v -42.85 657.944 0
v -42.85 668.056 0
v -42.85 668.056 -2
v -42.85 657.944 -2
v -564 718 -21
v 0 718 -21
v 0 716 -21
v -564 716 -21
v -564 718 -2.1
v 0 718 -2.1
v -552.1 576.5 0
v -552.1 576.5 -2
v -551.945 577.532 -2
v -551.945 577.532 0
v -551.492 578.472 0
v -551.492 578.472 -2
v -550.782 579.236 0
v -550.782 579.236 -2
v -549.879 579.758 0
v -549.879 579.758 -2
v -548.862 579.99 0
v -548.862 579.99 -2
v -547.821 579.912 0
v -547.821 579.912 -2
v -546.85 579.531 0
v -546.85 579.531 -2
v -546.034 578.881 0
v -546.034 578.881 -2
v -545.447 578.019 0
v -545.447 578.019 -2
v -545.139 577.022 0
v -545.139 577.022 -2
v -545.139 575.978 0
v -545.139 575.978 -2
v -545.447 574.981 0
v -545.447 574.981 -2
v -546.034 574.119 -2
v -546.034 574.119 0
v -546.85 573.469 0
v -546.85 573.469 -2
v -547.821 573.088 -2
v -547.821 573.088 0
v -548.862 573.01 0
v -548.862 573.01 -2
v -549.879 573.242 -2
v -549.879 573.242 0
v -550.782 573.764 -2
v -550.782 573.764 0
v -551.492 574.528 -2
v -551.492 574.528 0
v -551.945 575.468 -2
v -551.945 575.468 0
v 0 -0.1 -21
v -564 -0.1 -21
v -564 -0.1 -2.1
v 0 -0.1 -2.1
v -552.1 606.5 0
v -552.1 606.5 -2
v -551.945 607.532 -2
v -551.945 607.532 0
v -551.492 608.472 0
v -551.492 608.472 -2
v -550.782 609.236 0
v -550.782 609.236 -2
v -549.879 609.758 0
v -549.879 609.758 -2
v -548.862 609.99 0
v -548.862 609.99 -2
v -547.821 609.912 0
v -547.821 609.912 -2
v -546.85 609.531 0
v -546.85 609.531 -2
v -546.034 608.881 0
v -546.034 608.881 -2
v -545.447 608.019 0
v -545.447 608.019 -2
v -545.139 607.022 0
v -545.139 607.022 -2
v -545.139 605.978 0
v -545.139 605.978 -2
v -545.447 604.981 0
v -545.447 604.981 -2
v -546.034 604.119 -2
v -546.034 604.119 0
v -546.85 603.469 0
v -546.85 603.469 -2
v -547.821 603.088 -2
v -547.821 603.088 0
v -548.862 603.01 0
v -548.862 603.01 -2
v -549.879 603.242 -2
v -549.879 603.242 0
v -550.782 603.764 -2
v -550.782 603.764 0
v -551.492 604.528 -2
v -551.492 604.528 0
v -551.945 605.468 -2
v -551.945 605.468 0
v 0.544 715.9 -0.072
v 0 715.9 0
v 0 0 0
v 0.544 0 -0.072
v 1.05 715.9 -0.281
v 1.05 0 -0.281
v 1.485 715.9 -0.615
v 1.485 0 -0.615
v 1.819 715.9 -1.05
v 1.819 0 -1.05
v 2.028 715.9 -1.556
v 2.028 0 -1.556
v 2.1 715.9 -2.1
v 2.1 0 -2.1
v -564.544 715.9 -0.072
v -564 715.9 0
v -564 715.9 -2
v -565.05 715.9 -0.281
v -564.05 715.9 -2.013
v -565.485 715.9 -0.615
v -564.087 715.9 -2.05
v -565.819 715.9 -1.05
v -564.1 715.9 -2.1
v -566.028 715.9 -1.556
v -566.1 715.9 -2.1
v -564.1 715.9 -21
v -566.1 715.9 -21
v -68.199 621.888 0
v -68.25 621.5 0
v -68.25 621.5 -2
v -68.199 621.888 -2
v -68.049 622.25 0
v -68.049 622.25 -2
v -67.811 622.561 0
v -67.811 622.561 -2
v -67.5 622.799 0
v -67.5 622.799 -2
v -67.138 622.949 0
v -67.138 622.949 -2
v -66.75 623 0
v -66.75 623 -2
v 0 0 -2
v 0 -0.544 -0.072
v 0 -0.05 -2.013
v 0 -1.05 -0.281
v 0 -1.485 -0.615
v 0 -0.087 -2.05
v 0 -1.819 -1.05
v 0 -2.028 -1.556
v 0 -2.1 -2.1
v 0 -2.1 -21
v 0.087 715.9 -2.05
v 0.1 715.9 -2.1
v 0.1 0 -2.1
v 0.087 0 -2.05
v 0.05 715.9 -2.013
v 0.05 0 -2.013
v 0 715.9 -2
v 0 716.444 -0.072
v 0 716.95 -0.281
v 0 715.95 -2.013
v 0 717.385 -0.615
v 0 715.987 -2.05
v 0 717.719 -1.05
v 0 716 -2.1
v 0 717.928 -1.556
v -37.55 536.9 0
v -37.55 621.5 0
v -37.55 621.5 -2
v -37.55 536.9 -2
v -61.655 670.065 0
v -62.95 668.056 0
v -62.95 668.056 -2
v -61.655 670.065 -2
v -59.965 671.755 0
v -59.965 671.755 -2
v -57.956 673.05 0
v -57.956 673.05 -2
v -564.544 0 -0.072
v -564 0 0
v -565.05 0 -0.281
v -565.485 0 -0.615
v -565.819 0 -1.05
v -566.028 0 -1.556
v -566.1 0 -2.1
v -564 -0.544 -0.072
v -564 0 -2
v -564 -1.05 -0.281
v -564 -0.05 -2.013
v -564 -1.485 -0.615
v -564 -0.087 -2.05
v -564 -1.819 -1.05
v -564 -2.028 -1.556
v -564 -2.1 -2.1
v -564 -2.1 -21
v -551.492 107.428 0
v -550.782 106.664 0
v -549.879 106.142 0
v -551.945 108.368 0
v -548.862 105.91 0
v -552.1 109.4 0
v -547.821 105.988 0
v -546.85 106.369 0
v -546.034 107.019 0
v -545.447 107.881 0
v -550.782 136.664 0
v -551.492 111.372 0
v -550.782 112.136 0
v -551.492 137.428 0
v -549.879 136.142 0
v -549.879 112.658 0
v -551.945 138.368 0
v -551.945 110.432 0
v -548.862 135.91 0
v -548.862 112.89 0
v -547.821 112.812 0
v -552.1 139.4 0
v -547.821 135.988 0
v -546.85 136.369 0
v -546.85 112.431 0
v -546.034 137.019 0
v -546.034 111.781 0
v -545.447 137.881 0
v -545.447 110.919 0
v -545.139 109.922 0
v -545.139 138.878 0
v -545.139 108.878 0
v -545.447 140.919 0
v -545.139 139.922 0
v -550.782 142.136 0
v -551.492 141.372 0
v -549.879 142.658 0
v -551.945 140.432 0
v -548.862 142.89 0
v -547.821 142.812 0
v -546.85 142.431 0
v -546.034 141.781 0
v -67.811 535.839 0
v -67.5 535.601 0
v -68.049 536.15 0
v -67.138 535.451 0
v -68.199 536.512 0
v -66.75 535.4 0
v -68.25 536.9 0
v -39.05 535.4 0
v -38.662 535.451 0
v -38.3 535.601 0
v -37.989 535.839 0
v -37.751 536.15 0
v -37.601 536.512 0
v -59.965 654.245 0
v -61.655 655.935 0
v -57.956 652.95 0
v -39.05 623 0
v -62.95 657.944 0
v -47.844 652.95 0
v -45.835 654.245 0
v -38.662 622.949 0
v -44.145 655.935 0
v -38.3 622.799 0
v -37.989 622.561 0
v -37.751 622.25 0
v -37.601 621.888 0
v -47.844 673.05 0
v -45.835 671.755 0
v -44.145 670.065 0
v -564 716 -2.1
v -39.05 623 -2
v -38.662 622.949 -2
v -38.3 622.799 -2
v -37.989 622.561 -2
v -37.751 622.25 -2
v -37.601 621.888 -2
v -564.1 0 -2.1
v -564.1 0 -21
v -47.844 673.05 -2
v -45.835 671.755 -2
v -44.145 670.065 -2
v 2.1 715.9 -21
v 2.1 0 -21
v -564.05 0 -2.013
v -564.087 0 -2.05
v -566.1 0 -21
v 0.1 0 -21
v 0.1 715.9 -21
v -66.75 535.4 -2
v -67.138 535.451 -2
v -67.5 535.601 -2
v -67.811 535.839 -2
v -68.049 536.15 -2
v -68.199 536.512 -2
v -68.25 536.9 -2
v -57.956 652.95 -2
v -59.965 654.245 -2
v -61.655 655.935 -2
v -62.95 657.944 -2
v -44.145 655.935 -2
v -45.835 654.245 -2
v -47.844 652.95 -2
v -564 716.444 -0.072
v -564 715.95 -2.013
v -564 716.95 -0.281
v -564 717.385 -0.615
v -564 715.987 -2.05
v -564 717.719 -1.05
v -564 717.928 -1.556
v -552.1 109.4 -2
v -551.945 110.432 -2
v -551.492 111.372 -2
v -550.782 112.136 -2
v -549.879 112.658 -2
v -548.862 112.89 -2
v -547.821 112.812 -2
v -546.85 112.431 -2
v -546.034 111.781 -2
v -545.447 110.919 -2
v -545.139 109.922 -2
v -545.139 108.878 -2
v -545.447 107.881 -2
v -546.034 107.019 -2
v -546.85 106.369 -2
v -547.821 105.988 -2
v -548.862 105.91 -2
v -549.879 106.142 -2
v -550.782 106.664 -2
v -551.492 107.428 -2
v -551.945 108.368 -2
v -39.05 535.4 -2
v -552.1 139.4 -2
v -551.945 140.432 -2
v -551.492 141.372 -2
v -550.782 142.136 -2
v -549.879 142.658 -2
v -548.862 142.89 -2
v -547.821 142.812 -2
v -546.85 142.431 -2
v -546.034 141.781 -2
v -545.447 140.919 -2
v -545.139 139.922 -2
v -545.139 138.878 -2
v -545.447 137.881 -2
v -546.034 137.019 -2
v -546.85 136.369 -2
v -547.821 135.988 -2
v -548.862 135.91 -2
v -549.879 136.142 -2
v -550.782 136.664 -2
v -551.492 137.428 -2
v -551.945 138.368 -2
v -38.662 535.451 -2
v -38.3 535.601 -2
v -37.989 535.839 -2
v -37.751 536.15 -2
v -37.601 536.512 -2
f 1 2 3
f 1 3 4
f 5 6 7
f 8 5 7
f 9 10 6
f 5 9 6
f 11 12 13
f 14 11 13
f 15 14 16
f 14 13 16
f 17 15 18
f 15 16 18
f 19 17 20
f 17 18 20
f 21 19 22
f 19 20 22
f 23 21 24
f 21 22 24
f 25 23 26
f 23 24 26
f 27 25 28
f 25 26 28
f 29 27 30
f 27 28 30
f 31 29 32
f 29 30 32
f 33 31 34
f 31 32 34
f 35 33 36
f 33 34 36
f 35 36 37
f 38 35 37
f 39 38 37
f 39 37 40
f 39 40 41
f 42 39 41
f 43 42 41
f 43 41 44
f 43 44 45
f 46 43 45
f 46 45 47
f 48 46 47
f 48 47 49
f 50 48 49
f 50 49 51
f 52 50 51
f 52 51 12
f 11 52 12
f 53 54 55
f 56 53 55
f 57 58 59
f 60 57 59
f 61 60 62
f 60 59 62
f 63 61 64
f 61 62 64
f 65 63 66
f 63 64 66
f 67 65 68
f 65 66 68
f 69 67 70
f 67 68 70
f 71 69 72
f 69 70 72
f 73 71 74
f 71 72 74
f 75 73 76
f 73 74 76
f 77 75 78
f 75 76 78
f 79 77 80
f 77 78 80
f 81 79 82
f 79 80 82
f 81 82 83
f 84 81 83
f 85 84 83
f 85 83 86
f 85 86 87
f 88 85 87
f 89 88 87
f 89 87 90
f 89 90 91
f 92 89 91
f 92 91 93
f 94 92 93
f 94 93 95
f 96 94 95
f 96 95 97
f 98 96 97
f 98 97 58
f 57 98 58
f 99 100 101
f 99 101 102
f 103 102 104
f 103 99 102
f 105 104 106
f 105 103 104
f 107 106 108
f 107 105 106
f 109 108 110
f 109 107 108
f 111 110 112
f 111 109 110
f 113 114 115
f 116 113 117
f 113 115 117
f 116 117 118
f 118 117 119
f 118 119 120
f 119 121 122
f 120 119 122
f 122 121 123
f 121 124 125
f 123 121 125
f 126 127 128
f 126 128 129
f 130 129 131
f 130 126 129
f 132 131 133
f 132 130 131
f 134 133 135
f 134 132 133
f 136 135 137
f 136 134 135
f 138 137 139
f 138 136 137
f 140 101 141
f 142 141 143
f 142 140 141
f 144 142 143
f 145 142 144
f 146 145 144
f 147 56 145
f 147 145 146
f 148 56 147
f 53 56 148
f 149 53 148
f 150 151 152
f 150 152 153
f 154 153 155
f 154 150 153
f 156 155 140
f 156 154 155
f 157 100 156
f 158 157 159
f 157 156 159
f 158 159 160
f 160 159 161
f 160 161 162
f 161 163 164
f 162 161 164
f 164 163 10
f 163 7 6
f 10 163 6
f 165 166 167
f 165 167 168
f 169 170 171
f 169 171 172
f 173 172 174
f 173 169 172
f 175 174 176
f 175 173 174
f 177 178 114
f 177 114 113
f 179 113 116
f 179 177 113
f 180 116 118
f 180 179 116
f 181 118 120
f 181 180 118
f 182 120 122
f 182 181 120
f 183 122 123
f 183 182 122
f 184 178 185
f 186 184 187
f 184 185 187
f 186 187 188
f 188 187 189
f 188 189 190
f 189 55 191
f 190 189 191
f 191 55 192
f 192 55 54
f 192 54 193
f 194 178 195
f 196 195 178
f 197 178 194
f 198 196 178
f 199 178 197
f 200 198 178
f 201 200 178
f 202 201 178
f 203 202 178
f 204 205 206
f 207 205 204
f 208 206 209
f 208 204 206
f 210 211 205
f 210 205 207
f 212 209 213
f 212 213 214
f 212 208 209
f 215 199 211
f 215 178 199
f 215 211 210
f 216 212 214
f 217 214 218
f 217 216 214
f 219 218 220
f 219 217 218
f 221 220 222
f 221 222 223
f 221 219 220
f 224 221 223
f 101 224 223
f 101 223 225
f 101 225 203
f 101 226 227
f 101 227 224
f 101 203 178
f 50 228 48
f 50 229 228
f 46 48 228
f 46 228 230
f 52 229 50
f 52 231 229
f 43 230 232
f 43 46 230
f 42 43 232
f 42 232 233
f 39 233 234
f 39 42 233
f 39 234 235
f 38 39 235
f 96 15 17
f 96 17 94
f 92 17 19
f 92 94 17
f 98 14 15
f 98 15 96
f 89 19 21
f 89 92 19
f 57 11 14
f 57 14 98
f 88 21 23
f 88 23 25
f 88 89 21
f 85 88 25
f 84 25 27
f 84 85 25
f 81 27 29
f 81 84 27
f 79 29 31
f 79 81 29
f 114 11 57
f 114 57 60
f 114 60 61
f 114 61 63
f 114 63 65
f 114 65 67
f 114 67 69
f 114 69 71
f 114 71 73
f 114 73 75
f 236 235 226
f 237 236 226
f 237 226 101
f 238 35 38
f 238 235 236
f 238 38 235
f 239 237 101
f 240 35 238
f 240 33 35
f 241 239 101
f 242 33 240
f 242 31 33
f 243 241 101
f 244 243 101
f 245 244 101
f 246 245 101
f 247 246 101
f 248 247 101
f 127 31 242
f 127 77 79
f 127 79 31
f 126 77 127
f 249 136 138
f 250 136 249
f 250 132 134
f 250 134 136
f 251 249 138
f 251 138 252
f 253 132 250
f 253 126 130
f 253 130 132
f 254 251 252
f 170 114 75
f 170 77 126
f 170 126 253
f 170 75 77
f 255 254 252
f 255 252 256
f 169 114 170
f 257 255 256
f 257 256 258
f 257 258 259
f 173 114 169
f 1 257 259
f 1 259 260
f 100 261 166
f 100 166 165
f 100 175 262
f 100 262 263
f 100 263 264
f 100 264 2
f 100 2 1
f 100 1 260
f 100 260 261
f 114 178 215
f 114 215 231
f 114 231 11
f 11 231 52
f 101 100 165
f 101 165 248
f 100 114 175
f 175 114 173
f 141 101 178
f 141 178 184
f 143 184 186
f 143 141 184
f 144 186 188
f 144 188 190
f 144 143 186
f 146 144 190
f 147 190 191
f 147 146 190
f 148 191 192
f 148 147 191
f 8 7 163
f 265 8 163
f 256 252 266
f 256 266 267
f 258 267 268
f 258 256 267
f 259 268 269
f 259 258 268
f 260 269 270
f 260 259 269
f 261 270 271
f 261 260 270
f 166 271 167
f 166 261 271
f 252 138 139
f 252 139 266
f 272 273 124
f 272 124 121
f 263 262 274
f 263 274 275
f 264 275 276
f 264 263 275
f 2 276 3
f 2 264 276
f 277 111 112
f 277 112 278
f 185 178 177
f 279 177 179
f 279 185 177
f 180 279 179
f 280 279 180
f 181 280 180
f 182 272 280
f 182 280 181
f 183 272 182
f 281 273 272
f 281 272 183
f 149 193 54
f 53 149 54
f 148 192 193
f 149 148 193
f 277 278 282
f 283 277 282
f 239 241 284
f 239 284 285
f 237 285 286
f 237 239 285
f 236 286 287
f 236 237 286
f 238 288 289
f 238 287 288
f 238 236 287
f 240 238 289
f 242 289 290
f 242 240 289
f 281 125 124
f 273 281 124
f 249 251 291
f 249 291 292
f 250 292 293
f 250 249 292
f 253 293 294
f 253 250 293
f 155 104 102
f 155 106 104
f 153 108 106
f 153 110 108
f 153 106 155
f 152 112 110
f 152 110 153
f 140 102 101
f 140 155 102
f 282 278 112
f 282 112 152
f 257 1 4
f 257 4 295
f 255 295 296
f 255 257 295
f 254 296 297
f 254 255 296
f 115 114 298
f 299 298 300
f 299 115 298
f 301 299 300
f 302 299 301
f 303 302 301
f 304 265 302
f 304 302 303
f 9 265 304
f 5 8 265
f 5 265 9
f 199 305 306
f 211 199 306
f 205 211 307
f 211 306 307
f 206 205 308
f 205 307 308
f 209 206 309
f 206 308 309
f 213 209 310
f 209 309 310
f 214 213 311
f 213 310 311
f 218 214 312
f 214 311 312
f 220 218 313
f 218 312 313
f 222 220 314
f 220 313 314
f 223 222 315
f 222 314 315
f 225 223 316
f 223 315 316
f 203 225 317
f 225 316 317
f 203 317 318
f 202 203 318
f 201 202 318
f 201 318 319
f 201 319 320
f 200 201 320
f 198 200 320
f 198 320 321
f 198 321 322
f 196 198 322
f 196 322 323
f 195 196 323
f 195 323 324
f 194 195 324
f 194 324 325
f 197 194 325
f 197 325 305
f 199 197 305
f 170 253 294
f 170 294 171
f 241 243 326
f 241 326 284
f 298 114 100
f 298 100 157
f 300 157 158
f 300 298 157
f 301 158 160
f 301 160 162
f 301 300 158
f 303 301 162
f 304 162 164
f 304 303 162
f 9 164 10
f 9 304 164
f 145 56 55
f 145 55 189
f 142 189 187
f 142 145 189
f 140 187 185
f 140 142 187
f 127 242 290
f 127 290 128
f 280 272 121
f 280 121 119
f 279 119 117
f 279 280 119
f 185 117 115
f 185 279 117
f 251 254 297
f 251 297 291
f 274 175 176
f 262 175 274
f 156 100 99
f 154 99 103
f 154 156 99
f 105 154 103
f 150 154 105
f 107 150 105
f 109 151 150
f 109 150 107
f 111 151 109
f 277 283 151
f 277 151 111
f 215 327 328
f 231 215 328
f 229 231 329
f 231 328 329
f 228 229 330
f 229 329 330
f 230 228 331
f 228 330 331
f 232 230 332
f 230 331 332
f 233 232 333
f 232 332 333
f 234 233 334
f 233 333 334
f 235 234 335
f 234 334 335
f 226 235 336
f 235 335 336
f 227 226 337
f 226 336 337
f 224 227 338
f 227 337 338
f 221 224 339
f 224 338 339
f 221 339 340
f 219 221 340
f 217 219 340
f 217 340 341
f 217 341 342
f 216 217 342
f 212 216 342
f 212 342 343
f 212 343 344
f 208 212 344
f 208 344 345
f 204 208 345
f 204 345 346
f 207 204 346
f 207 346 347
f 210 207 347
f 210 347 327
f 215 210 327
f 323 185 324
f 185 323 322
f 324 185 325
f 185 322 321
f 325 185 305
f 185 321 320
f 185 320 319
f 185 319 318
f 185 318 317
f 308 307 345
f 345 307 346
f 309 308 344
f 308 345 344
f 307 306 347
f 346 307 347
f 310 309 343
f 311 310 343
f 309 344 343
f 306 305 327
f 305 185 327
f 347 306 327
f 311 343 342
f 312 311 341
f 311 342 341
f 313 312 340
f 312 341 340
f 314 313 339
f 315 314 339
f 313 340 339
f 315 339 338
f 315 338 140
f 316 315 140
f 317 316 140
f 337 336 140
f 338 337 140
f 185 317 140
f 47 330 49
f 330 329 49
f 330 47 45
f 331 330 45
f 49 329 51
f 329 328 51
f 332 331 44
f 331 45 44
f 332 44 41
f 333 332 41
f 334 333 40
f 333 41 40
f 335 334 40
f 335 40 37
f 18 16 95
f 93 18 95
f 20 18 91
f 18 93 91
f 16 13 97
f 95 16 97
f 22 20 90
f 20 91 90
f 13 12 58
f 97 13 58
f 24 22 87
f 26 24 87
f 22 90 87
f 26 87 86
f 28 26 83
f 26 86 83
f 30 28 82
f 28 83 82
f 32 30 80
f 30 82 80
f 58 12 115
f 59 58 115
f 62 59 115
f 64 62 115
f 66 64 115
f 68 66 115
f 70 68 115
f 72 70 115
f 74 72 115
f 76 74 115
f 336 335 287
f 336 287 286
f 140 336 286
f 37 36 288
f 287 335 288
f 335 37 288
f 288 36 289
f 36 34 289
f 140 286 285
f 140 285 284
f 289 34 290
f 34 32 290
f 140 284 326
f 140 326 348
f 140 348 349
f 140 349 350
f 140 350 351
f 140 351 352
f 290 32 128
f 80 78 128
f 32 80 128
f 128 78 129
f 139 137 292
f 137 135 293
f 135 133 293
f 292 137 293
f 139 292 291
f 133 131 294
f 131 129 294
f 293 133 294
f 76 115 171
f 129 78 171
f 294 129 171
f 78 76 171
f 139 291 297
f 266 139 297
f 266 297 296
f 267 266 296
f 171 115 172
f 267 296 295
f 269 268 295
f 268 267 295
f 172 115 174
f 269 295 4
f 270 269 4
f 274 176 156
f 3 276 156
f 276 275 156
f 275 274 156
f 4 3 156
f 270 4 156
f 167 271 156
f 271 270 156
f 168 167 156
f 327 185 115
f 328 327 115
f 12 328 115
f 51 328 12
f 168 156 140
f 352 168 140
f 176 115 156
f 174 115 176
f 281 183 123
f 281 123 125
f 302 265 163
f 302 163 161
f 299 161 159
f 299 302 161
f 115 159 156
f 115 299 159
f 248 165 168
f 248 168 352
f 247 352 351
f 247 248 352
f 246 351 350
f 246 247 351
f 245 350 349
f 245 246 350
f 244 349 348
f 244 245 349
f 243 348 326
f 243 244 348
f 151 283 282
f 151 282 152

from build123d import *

# Parameters (mm, degrees)
SKIZZE1_W                          = 564
SKIZZE1_H                          = 715.9
BASIS_BLECH_DEPTH                  = 2
KANTE_LASCHE1_DEPTH                = 715.9
KANTE_LASCHE2_DEPTH                = 564
KANTE_LASCHE3_DEPTH                = 715.9
KANTE_LASCHE4_DEPTH                = 564
SCHNITT_LINEAR_AUSTRAGEN1_REACH    = 916.568
F_7_0_7_DURCHMESSER_BOHRUNG1_D     = 7
F_7_0_7_DURCHMESSER_BOHRUNG1_DEPTH = 20
F_7_0_7_DURCHMESSER_BOHRUNG1_TIP   = 2.103012167


# Sheet-metal steps are written as plain solids
with BuildPart() as part:
    # Skizze1 → Basis-Blech (new body)
    with BuildSketch(Plane.XY):
        with Locations((-282, 357.95)):
            Rectangle(SKIZZE1_W, SKIZZE1_H)
    extrude(amount=-BASIS_BLECH_DEPTH)

    # Kante-Lasche1 section (across the edge) → Kante-Lasche1 (add)
    with BuildSketch(Plane(origin=(0.1, 715.9, -2), x_dir=(-1, 0, 0), z_dir=(0, -1, 0))):
        with BuildLine():
            Line((-2, 0.1), (-2, 19))
            Line((-2, 19), (0, 19))
            Line((0, 19), (0, 0.1))
            ThreePointArc((0, 0.1), (0.029289322, 0.029289322), (0.1, 0))
            Line((0.1, 0), (0.1, -2))
            ThreePointArc((0.1, -2), (-1.38492424, -1.38492424), (-2, 0.1))
        make_face()
    extrude(amount=KANTE_LASCHE1_DEPTH)

    # Kante-Lasche2 section (across the edge) → Kante-Lasche2 (add)
    with BuildSketch(Plane(origin=(-564, 716, -2), x_dir=(0, -1, 0), z_dir=(1, 0, 0))):
        with BuildLine():
            Line((-2, 0.1), (-2, 19))
            Line((-2, 19), (0, 19))
            Line((0, 19), (0, 0.1))
            ThreePointArc((0, 0.1), (0.029289322, 0.029289322), (0.1, 0))
            Line((0.1, 0), (0.1, -2))
            ThreePointArc((0.1, -2), (-1.38492424, -1.38492424), (-2, 0.1))
        make_face()
    extrude(amount=KANTE_LASCHE2_DEPTH)

    # Kante-Lasche3 section (across the edge) → Kante-Lasche3 (add)
    with BuildSketch(Plane(origin=(-564.1, 0, -2), x_dir=(1, 0, 0), z_dir=(0, 1, 0))):
        with BuildLine():
            Line((-2, 0.1), (-2, 19))
            Line((-2, 19), (0, 19))
            Line((0, 19), (0, 0.1))
            ThreePointArc((0, 0.1), (0.029289322, 0.029289322), (0.1, 0))
            Line((0.1, 0), (0.1, -2))
            ThreePointArc((0.1, -2), (-1.38492424, -1.38492424), (-2, 0.1))
        make_face()
    extrude(amount=KANTE_LASCHE3_DEPTH)

    # Kante-Lasche4 section (across the edge) → Kante-Lasche4 (add)
    with BuildSketch(Plane(origin=(0, -0.1, -2), x_dir=(0, 1, 0), z_dir=(-1, 0, 0))):
        with BuildLine():
            Line((-2, 0.1), (-2, 19))
            Line((-2, 19), (0, 19))
            Line((0, 19), (0, 0.1))
            ThreePointArc((0, 0.1), (0.029289322, 0.029289322), (0.1, 0))
            Line((0.1, 0), (0.1, -2))
            ThreePointArc((0.1, -2), (-1.38492424, -1.38492424), (-2, 0.1))
        make_face()
    extrude(amount=KANTE_LASCHE4_DEPTH)

    # Skizze17 → Schnitt-Linear austragen1 (cut, up to next)
    with BuildSketch(Plane.XY, mode=Mode.PRIVATE) as schnitt_linear_austragen1_sk1:
        with BuildLine():
            Line((-62.95, 657.944310136), (-62.95, 668.055689864))
            ThreePointArc((-62.95, 668.055689864), (-60.854951288, 670.954951288), (-57.955689864, 673.05))
            Line((-57.955689864, 673.05), (-47.844310136, 673.05))
            ThreePointArc((-47.844310136, 673.05), (-44.945048712, 670.954951288), (-42.85, 668.055689864))
            Line((-42.85, 668.055689864), (-42.85, 657.944310136))
            ThreePointArc((-42.85, 657.944310136), (-44.945048712, 655.045048712), (-47.844310136, 652.95))
            Line((-47.844310136, 652.95), (-57.955689864, 652.95))
            ThreePointArc((-57.955689864, 652.95), (-60.854951288, 655.045048712), (-62.95, 657.944310136))
        make_face()
    schnitt_linear_austragen1_tool1 = extrude(schnitt_linear_austragen1_sk1.sketch, amount=-SCHNITT_LINEAR_AUSTRAGEN1_REACH, mode=Mode.PRIVATE) & part.part
    # Skizze17 → Schnitt-Linear austragen1 (cut, up to next)
    with BuildSketch(Plane.XY, mode=Mode.PRIVATE) as schnitt_linear_austragen1_sk2:
        with BuildLine():
            Line((-66.75, 623), (-39.05, 623))
            ThreePointArc((-39.05, 623), (-37.989339828, 622.560660172), (-37.55, 621.5))
            Line((-37.55, 621.5), (-37.55, 536.9))
            ThreePointArc((-37.55, 536.9), (-37.989339828, 535.839339828), (-39.05, 535.4))
            Line((-39.05, 535.4), (-66.75, 535.4))
            ThreePointArc((-66.75, 535.4), (-67.810660172, 535.839339828), (-68.25, 536.9))
            Line((-68.25, 536.9), (-68.25, 621.5))
            ThreePointArc((-68.25, 621.5), (-67.810660172, 622.560660172), (-66.75, 623))
        make_face()
    schnitt_linear_austragen1_tool2 = extrude(schnitt_linear_austragen1_sk2.sketch, amount=-SCHNITT_LINEAR_AUSTRAGEN1_REACH, mode=Mode.PRIVATE) & part.part
    add(schnitt_linear_austragen1_tool1.solids().sort_by_distance((-52.9, 663, 0))[0], mode=Mode.SUBTRACT)
    add(schnitt_linear_austragen1_tool2.solids().sort_by_distance((-52.9, 579.2, 0))[0], mode=Mode.SUBTRACT)

    # Ø7.0 (7) Durchmesser Bohrung1
    with Locations(Plane.XY):
        with Locations((-548.6, 109.4), (-548.6, 139.4), (-548.6, 576.5), (-548.6, 606.5)):
            Hole(F_7_0_7_DURCHMESSER_BOHRUNG1_D / 2, depth=F_7_0_7_DURCHMESSER_BOHRUNG1_DEPTH)
            with Locations((0, 0, -(F_7_0_7_DURCHMESSER_BOHRUNG1_DEPTH + F_7_0_7_DURCHMESSER_BOHRUNG1_TIP / 2))):  # 118° drill point
                Cone(0, F_7_0_7_DURCHMESSER_BOHRUNG1_D / 2, F_7_0_7_DURCHMESSER_BOHRUNG1_TIP, mode=Mode.SUBTRACT)


solid = part.part
